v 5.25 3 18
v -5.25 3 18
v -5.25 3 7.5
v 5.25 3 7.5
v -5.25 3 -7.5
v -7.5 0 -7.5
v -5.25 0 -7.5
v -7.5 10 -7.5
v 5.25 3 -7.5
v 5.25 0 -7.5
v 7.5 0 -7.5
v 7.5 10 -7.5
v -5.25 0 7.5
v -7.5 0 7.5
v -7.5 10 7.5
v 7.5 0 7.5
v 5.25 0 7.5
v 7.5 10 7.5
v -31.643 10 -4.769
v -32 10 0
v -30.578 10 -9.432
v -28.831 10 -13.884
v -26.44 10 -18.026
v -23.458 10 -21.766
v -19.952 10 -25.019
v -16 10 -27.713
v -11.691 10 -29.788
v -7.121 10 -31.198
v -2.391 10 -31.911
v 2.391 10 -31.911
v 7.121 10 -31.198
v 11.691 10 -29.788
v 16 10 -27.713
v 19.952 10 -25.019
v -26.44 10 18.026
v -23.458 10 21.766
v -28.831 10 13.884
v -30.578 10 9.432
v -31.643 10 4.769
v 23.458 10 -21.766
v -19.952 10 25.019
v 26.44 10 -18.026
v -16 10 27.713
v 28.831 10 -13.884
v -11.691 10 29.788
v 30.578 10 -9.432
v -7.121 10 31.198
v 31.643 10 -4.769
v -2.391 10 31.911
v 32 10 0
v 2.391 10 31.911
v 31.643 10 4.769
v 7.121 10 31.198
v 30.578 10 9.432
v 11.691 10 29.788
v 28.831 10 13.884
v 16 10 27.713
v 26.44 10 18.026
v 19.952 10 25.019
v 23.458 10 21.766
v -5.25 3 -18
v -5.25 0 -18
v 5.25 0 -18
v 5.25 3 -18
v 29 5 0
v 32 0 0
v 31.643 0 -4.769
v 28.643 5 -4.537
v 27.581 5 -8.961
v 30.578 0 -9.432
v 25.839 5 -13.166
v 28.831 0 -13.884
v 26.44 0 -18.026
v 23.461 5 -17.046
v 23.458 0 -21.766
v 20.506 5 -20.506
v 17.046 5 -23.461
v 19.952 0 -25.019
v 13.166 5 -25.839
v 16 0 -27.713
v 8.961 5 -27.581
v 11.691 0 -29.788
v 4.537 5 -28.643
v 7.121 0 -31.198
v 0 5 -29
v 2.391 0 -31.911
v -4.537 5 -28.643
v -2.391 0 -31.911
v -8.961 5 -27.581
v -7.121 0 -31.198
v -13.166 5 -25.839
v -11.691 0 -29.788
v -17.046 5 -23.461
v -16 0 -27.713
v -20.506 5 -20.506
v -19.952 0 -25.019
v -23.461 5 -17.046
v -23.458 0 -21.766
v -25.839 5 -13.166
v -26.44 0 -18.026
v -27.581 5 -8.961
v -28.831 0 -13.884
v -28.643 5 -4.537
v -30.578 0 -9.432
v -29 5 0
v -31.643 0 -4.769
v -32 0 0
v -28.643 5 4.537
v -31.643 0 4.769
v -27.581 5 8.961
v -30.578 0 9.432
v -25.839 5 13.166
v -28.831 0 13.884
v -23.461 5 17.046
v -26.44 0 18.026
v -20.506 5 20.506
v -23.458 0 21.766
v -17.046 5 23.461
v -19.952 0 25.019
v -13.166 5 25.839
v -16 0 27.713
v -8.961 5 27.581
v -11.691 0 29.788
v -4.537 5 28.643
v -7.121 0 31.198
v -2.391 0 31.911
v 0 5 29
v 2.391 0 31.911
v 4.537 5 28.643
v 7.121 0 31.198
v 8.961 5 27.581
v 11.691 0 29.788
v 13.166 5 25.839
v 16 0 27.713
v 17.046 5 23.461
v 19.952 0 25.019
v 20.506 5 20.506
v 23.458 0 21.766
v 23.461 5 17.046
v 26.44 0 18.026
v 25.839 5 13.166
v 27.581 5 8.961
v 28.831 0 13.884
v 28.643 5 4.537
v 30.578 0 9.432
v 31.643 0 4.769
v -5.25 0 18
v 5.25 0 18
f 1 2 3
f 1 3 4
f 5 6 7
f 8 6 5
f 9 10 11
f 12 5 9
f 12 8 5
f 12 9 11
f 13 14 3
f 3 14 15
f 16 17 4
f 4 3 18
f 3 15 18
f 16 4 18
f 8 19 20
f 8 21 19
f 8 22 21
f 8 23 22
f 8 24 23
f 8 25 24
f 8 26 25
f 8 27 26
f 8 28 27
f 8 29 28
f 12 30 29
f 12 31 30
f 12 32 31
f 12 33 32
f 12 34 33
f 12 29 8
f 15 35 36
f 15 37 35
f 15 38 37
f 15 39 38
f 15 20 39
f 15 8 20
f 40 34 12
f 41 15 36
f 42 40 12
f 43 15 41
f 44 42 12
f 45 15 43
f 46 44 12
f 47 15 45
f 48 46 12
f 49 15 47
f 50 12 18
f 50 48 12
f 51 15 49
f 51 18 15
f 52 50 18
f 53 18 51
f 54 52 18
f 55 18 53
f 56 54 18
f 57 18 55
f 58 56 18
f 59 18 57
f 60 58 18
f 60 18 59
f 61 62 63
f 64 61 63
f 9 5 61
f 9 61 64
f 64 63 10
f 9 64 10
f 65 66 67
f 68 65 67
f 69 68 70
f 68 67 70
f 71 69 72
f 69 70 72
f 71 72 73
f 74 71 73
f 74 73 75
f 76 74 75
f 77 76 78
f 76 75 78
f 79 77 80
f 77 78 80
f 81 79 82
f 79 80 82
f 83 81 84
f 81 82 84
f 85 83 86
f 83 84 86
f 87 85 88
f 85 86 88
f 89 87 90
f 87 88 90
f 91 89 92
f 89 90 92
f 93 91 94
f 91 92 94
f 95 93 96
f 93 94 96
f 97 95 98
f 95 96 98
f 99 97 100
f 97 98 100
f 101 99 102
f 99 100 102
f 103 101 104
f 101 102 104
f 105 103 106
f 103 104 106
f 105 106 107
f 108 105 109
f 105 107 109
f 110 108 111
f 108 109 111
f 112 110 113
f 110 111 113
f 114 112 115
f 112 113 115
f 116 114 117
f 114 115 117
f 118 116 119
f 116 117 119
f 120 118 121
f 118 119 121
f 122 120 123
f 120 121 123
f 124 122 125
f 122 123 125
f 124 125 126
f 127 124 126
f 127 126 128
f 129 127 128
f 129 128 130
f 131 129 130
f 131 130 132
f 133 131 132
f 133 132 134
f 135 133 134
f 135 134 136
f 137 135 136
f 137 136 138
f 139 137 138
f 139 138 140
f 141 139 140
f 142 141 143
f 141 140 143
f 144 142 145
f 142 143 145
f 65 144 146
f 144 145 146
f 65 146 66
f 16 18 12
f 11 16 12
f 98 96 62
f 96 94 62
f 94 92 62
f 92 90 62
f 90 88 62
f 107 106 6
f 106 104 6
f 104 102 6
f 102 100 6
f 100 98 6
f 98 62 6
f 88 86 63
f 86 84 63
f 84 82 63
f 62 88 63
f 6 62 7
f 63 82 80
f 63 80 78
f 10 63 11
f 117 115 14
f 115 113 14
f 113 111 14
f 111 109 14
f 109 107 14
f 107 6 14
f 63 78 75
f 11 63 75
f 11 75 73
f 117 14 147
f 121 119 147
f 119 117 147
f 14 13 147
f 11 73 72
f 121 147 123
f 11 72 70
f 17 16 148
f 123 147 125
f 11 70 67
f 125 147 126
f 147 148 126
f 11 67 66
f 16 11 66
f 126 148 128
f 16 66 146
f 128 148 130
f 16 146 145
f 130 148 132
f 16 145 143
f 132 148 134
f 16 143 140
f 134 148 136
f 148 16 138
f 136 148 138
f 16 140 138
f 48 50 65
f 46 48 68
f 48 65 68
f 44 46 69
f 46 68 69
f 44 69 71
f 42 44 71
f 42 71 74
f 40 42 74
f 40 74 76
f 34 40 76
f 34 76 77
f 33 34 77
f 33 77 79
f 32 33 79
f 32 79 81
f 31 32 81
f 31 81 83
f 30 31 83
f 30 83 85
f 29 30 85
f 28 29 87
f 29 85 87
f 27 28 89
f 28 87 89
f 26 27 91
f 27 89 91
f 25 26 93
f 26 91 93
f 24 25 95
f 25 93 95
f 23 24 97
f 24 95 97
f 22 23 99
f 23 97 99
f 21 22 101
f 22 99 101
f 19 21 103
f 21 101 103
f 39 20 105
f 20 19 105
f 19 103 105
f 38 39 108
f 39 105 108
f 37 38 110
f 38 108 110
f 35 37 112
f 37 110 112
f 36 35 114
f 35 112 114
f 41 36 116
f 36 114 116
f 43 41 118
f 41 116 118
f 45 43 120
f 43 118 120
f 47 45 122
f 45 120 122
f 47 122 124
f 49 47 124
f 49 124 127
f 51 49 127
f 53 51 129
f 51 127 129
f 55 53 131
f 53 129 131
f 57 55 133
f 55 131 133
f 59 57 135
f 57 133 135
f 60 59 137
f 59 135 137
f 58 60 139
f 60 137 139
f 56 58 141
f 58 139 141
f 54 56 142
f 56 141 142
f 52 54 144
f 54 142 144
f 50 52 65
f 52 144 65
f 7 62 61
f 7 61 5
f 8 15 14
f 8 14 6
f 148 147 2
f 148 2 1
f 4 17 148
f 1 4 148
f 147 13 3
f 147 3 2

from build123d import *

# Parameters (mm, degrees)
SKETCH1_R           = 32
BOSS_EXTRUDE1_DEPTH = 10
SKETCH3_W           = 15
SKETCH3_H           = 15
CUT_EXTRUDE1_DEPTH  = 47.346520905
SKETCH4_W           = 10.5
SKETCH4_H           = 10.5
CUT_EXTRUDE2_DEPTH  = 3


with BuildPart() as part:
    # Sketch1 → Boss-Extrude1 (new body)
    with BuildSketch(Plane(origin=(0, 0, 0), x_dir=(1, 0, 0), z_dir=(0, 1, 0))):
        Circle(SKETCH1_R)
    extrude(amount=BOSS_EXTRUDE1_DEPTH)

    # Cut-Sweep1: sweep along a path in Sketch1<2>
    with BuildLine(Plane(origin=(0, 0, 0), x_dir=(1, 0, 0), z_dir=(0, 1, 0))) as cut_sweep1_path:
        CenterArc((0, 0), 32, 0, 360)
    # Sketch2 → Cut-Sweep1 (sweep, cut)
    with BuildSketch(Plane.XY):
        Polygon((32, 10), (29, 5), (32, 0), align=None)
    sweep(path=cut_sweep1_path.line, mode=Mode.SUBTRACT)

    # Sketch3 → Cut-Extrude1 (cut, through all)
    with BuildSketch(Plane(origin=(0, 10, 0), x_dir=(1, 0, 0), z_dir=(0, 1, 0))):
        Rectangle(SKETCH3_W, SKETCH3_H)
    extrude(amount=-CUT_EXTRUDE1_DEPTH, mode=Mode.SUBTRACT)

    # Sketch4 → Cut-Extrude2 (cut)
    with BuildSketch(Plane.XZ):
        with Locations((0, 12.75)):
            Rectangle(SKETCH4_W, SKETCH4_H)
        with Locations((0, -12.75)):
            Rectangle(SKETCH4_W, SKETCH4_H)
    extrude(amount=-CUT_EXTRUDE2_DEPTH, mode=Mode.SUBTRACT)


solid = part.part
